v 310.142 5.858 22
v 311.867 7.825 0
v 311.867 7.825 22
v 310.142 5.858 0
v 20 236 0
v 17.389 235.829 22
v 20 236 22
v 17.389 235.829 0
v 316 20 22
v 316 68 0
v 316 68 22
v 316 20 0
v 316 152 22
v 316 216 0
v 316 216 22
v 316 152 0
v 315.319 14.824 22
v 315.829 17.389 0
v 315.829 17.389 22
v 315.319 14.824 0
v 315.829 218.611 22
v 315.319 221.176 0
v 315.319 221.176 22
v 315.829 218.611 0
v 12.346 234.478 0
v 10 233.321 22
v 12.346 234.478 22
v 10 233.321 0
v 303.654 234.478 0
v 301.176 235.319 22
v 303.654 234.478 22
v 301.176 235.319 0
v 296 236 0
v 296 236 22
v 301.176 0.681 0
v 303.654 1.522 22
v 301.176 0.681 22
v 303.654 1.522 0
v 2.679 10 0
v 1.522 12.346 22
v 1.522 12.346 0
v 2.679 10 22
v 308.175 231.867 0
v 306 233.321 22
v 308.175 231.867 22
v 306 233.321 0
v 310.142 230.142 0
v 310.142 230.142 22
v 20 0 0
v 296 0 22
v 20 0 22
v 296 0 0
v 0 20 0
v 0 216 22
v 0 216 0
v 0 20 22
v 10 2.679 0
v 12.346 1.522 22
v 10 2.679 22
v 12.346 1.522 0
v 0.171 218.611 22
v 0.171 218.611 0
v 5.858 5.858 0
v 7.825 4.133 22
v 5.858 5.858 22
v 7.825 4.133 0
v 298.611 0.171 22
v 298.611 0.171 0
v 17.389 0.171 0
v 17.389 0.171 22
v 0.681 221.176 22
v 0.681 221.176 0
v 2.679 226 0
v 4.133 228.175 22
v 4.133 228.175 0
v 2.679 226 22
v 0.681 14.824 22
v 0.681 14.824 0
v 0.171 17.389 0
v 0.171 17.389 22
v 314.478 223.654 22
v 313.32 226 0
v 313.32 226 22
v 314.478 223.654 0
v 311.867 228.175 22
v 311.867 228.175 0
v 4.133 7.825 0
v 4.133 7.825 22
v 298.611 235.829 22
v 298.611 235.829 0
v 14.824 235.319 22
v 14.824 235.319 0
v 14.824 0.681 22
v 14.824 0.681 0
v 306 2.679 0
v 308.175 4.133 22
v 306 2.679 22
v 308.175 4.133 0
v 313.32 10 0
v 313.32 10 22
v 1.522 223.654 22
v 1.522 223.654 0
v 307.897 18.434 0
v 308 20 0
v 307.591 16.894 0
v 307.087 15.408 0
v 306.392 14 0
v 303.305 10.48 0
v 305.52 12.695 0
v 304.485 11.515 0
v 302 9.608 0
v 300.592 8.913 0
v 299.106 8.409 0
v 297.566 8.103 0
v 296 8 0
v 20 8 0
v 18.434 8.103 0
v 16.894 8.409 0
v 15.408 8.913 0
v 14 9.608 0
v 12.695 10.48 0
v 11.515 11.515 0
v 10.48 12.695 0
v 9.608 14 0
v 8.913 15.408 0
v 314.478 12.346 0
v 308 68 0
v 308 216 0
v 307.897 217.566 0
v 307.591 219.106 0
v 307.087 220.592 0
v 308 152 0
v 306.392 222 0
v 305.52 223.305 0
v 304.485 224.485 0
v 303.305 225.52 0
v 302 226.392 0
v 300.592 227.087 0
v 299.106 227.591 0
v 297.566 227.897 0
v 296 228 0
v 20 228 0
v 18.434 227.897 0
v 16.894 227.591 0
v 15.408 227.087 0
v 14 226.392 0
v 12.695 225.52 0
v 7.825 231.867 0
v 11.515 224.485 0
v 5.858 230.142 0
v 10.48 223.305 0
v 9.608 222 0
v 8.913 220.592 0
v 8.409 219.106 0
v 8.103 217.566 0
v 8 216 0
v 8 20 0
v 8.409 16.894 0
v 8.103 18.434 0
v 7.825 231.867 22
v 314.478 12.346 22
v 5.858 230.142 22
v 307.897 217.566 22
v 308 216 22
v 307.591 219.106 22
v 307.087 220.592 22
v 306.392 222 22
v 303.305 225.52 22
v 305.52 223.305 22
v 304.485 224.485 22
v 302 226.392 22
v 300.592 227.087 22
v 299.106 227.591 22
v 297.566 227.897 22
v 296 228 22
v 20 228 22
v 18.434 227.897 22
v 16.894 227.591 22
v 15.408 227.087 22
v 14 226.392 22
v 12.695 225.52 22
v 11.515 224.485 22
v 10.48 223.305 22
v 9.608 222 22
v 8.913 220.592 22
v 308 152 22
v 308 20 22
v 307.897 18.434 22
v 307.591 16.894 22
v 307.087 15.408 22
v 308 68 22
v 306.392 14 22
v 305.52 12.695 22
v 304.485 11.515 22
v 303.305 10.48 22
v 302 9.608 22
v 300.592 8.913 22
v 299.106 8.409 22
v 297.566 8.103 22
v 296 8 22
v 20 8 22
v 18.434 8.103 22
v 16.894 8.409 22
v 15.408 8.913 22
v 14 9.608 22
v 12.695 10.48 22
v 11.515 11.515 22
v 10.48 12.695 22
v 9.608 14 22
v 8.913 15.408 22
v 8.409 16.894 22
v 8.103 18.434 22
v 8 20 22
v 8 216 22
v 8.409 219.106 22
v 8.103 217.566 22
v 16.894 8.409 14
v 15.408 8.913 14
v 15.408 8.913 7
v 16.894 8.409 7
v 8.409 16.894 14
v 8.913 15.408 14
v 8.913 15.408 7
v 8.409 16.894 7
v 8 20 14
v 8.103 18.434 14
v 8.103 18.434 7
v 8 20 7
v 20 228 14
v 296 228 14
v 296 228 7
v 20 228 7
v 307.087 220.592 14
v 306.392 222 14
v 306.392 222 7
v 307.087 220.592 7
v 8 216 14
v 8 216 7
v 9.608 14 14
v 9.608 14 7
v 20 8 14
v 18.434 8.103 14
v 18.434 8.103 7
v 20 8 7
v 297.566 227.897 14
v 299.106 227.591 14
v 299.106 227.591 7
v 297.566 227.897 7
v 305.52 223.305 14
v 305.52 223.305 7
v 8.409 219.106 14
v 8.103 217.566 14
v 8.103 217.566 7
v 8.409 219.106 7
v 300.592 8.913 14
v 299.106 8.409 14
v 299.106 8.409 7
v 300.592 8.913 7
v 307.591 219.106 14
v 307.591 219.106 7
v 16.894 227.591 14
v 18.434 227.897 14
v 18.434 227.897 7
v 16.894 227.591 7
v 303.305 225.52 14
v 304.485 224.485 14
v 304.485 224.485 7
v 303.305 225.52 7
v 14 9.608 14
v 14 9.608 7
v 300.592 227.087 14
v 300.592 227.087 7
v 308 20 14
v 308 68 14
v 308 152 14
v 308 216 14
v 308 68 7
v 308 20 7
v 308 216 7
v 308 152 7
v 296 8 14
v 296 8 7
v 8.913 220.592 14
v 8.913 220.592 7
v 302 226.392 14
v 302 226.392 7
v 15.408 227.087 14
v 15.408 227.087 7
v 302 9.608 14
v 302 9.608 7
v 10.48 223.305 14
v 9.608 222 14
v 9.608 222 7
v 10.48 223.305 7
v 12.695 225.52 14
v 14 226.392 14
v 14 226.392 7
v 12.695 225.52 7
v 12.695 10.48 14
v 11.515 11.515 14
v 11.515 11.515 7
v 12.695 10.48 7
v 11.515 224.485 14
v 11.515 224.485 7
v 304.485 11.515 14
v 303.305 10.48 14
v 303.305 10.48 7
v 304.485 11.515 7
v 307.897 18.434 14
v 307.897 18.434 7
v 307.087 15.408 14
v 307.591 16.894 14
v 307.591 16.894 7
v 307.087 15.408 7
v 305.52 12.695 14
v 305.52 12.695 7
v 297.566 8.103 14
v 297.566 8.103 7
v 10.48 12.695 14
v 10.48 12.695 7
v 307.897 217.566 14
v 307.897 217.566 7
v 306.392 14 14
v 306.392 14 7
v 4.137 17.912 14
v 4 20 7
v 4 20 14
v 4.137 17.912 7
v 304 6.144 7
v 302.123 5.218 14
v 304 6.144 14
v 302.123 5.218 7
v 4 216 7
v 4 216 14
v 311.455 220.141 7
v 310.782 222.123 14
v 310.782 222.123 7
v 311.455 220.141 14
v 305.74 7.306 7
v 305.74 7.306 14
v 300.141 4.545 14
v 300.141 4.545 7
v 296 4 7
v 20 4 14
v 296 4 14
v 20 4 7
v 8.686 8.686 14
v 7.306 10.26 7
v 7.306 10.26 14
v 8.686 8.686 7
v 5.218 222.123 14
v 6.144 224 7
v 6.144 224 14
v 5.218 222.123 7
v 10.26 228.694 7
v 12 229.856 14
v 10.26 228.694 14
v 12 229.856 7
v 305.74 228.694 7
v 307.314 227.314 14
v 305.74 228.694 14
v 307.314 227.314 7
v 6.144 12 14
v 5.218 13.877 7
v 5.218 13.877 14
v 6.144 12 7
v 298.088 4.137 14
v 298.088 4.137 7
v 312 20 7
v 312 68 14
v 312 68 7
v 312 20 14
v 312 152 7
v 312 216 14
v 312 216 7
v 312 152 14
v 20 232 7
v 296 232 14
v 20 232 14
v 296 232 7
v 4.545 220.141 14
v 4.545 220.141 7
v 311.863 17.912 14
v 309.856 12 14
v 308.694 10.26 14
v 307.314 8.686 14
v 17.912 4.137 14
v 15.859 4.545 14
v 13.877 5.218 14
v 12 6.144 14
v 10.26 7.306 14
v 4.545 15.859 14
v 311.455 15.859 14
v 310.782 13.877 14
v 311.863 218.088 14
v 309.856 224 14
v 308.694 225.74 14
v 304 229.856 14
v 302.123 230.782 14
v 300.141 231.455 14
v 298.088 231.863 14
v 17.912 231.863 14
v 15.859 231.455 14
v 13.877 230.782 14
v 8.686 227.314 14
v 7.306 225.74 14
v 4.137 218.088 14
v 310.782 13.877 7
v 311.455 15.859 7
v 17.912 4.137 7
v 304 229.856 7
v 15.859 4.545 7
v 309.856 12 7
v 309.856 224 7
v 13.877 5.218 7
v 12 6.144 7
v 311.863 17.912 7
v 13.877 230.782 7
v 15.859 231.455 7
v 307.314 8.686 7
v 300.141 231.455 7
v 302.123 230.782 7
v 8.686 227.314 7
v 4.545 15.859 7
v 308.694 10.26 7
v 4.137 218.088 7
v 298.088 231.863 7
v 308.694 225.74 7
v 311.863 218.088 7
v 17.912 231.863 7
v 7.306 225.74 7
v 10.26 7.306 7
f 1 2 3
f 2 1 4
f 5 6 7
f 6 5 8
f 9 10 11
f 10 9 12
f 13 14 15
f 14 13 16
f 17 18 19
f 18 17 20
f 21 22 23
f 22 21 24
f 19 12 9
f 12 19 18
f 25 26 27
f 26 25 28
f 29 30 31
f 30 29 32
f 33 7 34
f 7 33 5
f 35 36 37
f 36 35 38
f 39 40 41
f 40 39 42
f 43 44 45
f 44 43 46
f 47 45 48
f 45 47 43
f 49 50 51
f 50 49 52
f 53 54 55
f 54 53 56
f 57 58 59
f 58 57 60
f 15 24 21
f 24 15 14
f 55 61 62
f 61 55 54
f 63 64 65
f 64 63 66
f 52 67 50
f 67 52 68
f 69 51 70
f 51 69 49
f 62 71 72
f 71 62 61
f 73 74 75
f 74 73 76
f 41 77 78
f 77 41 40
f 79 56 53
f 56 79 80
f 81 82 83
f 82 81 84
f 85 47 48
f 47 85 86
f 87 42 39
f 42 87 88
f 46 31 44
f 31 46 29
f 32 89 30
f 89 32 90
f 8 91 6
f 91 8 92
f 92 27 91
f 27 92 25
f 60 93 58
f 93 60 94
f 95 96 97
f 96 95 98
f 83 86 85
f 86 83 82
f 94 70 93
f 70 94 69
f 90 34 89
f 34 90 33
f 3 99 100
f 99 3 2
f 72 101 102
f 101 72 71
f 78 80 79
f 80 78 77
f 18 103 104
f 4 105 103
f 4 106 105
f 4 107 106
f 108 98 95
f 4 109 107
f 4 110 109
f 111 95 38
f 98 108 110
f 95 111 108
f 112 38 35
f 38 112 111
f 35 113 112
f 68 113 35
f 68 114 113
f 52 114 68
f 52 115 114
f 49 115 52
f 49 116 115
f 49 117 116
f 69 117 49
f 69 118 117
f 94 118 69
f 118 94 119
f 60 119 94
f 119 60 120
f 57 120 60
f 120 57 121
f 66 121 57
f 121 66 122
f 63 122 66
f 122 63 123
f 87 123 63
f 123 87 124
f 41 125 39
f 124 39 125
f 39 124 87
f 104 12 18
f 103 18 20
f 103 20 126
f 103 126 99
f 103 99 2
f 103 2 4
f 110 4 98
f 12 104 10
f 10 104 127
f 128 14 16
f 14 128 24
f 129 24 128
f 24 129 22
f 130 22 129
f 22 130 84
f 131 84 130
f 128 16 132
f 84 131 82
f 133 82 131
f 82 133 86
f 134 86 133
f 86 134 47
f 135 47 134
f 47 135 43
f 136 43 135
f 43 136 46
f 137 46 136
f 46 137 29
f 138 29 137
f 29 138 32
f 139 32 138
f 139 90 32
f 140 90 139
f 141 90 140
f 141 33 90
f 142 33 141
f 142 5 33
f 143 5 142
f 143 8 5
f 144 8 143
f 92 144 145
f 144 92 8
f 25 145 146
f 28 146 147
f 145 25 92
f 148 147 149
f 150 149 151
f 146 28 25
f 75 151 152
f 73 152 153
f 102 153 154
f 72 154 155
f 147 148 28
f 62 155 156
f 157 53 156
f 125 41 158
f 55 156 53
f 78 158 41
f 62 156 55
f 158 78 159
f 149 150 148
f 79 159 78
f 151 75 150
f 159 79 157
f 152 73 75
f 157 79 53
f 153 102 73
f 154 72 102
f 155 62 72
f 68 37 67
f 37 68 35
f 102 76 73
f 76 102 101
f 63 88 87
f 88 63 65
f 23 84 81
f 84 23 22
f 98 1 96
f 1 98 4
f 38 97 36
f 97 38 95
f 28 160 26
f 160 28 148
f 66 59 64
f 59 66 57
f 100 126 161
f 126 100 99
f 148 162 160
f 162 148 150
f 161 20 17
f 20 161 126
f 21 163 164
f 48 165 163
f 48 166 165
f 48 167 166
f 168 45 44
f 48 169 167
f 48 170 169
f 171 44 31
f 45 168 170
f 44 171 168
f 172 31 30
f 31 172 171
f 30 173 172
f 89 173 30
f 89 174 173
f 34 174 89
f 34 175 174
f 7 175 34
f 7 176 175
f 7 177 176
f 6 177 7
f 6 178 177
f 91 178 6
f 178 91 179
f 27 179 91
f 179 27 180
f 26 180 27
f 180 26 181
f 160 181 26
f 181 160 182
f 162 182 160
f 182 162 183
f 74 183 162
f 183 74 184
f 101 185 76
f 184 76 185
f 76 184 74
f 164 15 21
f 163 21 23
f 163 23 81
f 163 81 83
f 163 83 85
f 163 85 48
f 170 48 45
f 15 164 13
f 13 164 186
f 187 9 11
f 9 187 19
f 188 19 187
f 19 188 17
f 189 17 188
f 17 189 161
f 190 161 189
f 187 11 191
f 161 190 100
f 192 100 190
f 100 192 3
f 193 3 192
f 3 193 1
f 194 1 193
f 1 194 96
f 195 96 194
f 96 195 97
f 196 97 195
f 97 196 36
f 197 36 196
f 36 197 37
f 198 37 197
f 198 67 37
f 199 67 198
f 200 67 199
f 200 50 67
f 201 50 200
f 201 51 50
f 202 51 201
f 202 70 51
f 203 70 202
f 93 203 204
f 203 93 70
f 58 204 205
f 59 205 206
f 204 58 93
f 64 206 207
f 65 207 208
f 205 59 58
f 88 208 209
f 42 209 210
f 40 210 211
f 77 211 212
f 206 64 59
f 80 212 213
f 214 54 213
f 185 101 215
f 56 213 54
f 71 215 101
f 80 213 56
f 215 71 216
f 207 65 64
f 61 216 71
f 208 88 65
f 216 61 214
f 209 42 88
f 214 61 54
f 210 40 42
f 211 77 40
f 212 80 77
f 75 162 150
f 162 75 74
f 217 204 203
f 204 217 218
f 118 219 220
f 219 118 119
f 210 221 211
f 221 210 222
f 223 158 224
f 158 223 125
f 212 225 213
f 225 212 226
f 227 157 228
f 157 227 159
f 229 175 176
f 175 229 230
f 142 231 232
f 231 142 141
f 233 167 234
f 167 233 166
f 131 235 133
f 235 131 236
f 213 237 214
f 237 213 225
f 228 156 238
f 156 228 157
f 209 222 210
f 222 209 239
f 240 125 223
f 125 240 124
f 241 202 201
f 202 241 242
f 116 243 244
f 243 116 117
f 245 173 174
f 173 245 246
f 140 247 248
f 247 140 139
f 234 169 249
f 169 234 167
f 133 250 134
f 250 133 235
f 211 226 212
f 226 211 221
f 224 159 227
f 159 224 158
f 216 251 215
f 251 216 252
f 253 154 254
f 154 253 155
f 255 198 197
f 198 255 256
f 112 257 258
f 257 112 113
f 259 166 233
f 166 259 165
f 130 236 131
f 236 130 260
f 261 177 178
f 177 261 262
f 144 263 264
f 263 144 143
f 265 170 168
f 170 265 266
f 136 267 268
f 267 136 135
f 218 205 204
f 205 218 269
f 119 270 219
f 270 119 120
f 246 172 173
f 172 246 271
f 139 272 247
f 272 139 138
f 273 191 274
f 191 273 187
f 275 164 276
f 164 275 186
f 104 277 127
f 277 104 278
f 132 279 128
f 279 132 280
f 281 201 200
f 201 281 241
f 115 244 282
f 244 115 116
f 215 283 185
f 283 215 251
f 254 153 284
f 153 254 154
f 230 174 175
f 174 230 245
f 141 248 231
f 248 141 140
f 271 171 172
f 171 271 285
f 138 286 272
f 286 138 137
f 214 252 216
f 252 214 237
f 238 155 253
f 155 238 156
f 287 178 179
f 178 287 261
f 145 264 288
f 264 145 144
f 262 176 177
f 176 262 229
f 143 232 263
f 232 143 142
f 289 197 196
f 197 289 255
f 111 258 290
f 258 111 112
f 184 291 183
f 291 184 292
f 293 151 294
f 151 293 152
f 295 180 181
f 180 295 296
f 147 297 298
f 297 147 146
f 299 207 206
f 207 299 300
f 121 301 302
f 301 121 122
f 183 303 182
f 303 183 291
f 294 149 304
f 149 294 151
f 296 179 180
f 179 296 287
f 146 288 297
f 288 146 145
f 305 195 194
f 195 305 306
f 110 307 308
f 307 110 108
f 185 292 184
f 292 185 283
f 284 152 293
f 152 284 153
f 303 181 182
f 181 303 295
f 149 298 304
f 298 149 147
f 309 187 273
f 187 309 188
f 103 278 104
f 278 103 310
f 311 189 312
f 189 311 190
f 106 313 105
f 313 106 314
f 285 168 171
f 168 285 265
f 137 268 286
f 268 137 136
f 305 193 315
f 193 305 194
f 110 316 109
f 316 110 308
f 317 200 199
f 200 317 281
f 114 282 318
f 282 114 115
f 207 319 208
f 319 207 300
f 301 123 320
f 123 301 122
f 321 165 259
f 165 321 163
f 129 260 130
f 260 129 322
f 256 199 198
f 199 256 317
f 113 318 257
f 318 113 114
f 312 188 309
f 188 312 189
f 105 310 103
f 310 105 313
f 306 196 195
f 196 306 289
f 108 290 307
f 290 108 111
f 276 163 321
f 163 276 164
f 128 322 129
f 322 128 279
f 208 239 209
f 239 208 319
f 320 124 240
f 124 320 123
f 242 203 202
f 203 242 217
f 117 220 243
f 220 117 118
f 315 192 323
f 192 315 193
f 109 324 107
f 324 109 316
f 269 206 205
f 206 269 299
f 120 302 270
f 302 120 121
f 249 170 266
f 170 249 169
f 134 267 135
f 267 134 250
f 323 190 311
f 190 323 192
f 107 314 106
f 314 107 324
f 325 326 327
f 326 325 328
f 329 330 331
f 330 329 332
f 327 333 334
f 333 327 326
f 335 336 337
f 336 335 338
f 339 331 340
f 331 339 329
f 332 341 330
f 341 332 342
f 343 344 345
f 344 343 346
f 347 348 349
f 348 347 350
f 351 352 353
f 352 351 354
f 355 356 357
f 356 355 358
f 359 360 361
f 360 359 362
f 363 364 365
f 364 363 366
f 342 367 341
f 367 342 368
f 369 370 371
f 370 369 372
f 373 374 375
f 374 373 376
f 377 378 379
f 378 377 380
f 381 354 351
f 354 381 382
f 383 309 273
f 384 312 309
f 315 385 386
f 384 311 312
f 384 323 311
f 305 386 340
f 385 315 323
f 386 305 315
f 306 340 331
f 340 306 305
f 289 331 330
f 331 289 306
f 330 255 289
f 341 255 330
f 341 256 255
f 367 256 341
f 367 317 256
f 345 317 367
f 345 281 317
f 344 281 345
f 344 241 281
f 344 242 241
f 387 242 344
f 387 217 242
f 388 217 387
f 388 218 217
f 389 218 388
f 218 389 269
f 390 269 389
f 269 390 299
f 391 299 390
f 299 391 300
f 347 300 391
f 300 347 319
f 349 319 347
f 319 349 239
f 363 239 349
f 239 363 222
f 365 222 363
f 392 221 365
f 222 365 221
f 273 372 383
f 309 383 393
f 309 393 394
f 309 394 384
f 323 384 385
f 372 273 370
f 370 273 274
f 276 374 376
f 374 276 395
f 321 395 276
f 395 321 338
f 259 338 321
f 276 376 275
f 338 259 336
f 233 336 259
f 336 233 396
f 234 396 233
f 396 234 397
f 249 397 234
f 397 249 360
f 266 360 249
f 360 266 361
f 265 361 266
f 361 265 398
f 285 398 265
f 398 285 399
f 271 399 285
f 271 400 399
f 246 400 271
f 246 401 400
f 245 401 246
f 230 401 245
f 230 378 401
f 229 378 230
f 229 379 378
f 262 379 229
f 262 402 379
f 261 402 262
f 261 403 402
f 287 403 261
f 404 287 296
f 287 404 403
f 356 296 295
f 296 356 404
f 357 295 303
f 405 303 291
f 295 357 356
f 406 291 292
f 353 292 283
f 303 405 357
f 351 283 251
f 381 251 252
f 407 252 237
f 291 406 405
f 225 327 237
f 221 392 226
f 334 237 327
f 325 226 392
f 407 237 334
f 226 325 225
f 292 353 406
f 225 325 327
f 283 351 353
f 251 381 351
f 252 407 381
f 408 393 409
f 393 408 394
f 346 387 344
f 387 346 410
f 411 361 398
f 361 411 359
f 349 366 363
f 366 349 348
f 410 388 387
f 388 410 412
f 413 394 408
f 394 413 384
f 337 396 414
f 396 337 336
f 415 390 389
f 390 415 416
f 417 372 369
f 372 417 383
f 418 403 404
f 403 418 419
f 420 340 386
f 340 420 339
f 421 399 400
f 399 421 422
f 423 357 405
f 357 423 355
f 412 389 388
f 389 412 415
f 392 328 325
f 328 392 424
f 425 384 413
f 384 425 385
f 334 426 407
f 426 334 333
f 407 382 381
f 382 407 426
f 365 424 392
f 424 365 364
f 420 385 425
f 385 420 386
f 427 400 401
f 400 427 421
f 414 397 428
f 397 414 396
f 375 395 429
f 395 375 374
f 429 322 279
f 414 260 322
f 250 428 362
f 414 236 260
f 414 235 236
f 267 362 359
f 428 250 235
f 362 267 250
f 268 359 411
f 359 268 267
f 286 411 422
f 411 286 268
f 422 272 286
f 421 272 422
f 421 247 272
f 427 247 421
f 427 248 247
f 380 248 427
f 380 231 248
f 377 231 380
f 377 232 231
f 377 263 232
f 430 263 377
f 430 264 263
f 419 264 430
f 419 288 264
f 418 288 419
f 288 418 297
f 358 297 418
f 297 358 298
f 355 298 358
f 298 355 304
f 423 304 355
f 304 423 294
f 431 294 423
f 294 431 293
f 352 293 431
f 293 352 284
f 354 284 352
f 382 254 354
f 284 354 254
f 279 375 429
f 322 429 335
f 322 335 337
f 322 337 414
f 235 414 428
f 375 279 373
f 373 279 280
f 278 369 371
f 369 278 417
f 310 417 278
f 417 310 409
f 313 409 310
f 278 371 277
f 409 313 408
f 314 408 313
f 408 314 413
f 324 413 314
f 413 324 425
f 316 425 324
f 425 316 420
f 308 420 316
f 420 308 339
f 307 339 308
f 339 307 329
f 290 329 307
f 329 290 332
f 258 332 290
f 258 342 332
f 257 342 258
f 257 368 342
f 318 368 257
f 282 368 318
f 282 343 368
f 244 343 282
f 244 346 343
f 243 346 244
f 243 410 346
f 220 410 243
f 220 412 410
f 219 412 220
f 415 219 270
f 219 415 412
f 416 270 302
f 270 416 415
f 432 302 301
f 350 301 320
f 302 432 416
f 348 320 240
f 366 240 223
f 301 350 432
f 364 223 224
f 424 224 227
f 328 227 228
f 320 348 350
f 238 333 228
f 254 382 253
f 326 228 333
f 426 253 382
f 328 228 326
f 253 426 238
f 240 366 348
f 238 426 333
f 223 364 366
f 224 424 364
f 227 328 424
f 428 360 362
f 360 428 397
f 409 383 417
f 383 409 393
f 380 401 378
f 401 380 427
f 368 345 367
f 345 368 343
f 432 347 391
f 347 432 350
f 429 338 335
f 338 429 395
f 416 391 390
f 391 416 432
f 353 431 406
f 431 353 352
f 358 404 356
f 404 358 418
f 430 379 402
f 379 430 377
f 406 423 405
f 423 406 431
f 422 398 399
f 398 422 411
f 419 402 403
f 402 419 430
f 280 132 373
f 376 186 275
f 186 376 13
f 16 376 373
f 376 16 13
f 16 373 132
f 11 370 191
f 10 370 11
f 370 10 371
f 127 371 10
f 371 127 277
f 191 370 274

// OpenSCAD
// file: robot_params.scad
// Shared mechanical parameters for Codex house companion CAD v0.
// Units: millimeters.
$fn = 48;

// Body envelope
base_len = 300;
base_w = 220;
base_floor_th = 4;
wall_th = 3;
corner_r = 12;
base_wall_h = 34;
deck_z = 48;
total_body_h = 112;

// Personality / render colors
codex_teal = "#13C8C3";
codex_blue = "#2F6BFF";
codex_cream = "#F5F0E6";
codex_charcoal = "#242832";
codex_lime = "#B9FF66";
codex_orange = "#FF9F1C";
bumper_tpu = "#2B2F3A";

// Drive
wheel_d = 80;
wheel_w = 24;
axle_z = 42;
axle_x = 145;
wheel_clearance = 5;
motor_mount_slot = 5;
motor_pod_len = 72;
motor_pod_w = 36;
motor_pod_h = 46;

// Fasteners
m3_clearance_d = 3.4;
m3_insert_d = 4.8;
m3_insert_depth = 5.7;
m25_clearance_d = 2.8;
m2_clearance_d = 2.3;

// Electronics
pi_len = 85;
pi_w = 56;
pi_mount_x = 58;
pi_mount_y = 49;
hat_keepout_z = 28;
cooling_keepout_z = 18;
deck_th = 4;
deck_offset_x = 18;
deck_offset_y = 14;
deck_mount_x = [24, base_len-60];
deck_mount_y = [20, base_w-62];
deck_boss_x = [deck_offset_x + deck_mount_x[0], deck_offset_x + deck_mount_x[1]];
deck_boss_y = [deck_offset_y + deck_mount_y[0], deck_offset_y + deck_mount_y[1]];
deck_len = base_len - 36;
deck_w = base_w - 42;

// Battery
battery_len = 110;
battery_w = 38;
battery_h = 38;
battery_padding = 3;
strap_slot_w = 8;
strap_slot_len = 46;
battery_cradle_mount_x = [12, battery_len + 2*battery_padding + 2];
battery_cradle_mount_y = [10, battery_w + 2*battery_padding + 2];

// Storage keepout for later USB 3 module
usb_storage_len = 90;
usb_storage_w = 35;
usb_storage_h = 12;
usb_cable_bend_r = 25;

// Sensors and expression
head_z = 205;
mast_h = 120;
mast_w = 38;
mast_d = 32;
head_w = 96;
head_h = 58;
head_d = 46;
camera_board_w = 25;
camera_board_h = 24;
tof_pod_w = 24;
tof_pod_h = 18;
tof_pod_d = 18;
front_sensor_angle = 20;
bumper_travel = 8;
soft_bumper_h = 22;

// Assembly anchors / safety placeholders
battery_cradle_x = 166;
battery_cradle_y = base_w/2 - (battery_w + 2*battery_padding + 12)/2;
motor_pod_anchor_x = [axle_x-28, axle_x+28];
motor_pod_anchor_y = [base_w/2 - 61, base_w/2 + 61];
motor_pod_local_hole_x = [8, 64];
motor_pod_local_hole_y = motor_pod_w/2;
estop_x = base_len - 62;
estop_y = base_w/2;
estop_mount_d = 22;
estop_guard_d = 48;
estop_plate_w = 70;
estop_plate_d = 62;
estop_plate_th = 5;
estop_plate_mount_x = [10, estop_plate_w - 10];
estop_plate_mount_y = [10, estop_plate_d - 10];

// Split-print helpers for common 220 x 220 mm beds
base_split_x = base_len/2;
deck_split_x = deck_len/2;
seam_screw_offset = 14;
base_seam_y = [42, base_w/2, base_w-42];
deck_seam_y = [36, deck_w/2, deck_w-36];
seam_plate_w = 64;
seam_plate_d = 18;
seam_plate_th = 3;

module rounded_box(size=[10,10,10], r=2, center=false) {
  // Lightweight printable rounded rectangle prism using hull of cylinders.
  translate(center ? [-size[0]/2, -size[1]/2, -size[2]/2] : [0,0,0])
  hull() {
    for (x=[r, size[0]-r]) for (y=[r, size[1]-r])
      translate([x,y,0]) cylinder(h=size[2], r=r);
  }
}

module screw_hole(d=m3_clearance_d, h=20) {
  cylinder(h=h, d=d, center=true);
}

module preview_only() {
  if ($preview) children();
}

module insert_boss(d=10, h=8, hole=m3_insert_d) {
  difference() { cylinder(h=h, d=d); translate([0,0,-1]) cylinder(h=h+2, d=hole); }
}
// main file
include <robot_params.scad>
module bumper_carrier() {
  color(bumper_tpu)
  difference(){
    union(){
      rounded_box([base_len+2*bumper_travel, base_w+2*bumper_travel, soft_bumper_h], corner_r+bumper_travel);
    }
    translate([bumper_travel,bumper_travel,-1]) rounded_box([base_len,base_w,soft_bumper_h+2],corner_r);
    // shallow outer groove for TPU/foam strip adhesive or captured sleeve
    translate([4,4,7]) rounded_box([base_len+2*bumper_travel-8, base_w+2*bumper_travel-8, 7], corner_r+4);
    translate([12,12,6]) rounded_box([base_len+2*bumper_travel-24, base_w+2*bumper_travel-24, 9], corner_r);
    // tray attachment holes
    for (x=[42,base_len-42]) for (y=[18,base_w-18]) translate([x+bumper_travel,y+bumper_travel,-1]) cylinder(h=40,d=m3_clearance_d);
    // rear service opening
    translate([base_len-40,base_w/2-42,-1]) cube([70,84,soft_bumper_h+2]);
  }
  preview_only() {
    // inward switch paddles that close microswitches before rigid chassis contact
    color(codex_lime) {
      for (x=[60,base_len/2,base_len-60]) translate([x+bumper_travel,bumper_travel+2,soft_bumper_h-3]) cube([22,8,12],center=true);
      for (y=[58,base_w-58]) {
        translate([bumper_travel+5,y+bumper_travel,soft_bumper_h-3]) cube([8,22,12],center=true);
        translate([base_len+bumper_travel-5,y+bumper_travel,soft_bumper_h-3]) cube([8,22,12],center=true);
      }
    }
    color(codex_lime) for (x=[42,base_len-42]) translate([x+bumper_travel,bumper_travel+2,soft_bumper_h]) cube([22,4,10],center=true);
    // simple microswitch placeholders on inner front wall and sides
    color(codex_orange) {
      for (x=[60,base_len/2,base_len-60]) translate([x+bumper_travel,bumper_travel+14,5]) cube([20,6,10],center=true);
      for (y=[58,base_w-58]) {
        translate([bumper_travel+17,y+bumper_travel,5]) cube([6,20,10],center=true);
        translate([base_len+bumper_travel-17,y+bumper_travel,5]) cube([6,20,10],center=true);
      }
    }
  }
}
bumper_carrier();
